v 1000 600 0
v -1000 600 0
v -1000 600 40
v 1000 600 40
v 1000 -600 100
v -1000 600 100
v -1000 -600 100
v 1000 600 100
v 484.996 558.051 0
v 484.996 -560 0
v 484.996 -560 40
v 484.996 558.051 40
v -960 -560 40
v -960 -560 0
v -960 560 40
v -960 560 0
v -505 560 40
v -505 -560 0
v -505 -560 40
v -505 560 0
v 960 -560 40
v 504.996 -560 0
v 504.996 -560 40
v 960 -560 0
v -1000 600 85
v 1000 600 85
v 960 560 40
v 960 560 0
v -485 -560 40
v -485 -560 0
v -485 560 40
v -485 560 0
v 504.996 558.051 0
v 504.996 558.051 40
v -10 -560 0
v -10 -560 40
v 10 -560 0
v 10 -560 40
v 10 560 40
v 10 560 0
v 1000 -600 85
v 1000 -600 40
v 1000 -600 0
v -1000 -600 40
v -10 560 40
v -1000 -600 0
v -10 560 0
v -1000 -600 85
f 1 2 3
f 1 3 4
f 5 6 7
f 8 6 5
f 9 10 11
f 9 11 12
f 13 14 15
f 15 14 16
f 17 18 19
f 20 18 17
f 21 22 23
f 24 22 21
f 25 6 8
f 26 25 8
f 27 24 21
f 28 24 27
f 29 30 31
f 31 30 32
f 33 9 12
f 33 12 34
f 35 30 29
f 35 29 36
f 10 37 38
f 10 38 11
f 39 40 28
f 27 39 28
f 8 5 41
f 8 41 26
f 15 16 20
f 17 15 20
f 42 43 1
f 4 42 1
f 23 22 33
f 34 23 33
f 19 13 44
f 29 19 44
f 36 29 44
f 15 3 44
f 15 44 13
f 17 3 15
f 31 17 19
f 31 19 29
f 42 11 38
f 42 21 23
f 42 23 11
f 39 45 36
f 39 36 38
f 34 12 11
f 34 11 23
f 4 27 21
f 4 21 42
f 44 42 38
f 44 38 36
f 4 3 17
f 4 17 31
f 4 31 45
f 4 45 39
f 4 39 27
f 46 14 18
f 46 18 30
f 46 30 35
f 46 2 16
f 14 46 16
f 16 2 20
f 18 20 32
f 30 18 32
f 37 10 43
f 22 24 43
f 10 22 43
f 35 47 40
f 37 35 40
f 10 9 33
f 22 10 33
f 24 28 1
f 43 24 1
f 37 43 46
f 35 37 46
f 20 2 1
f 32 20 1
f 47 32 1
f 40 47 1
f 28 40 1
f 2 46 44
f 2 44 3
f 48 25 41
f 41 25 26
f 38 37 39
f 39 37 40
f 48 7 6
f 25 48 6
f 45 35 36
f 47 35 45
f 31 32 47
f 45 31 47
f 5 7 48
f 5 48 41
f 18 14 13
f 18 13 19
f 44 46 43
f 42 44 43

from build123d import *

# Parameters (mm, degrees)
F0_W     = 2000
F0_H     = 1200
F0_W_2   = 1920
F0_H_2   = 1120
F2_DEPTH = 40
F1_W     = 20
F1_H     = 1120
F3_DEPTH = 40
F5_W     = 2000
F5_H     = 1200
F6_DEPTH = 15


with BuildPart() as f2:
    # F0 (on Top) → F2 (new body)
    with BuildSketch(Plane.XY):
        Rectangle(F0_W, F0_H)
        Rectangle(F0_W_2, F0_H_2, mode=Mode.SUBTRACT)
    extrude(amount=F2_DEPTH)

    # F1 (on Top) → F3 (join)
    with BuildSketch(Plane.XY):
        Rectangle(F1_W, F1_H)
        with Locations((494.996164, -1.948804)):
            Rectangle(F1_W, F1_H)
        with Locations((-495, 0)):
            Rectangle(F1_W, F1_H)
    extrude(amount=F3_DEPTH)


with BuildPart() as f6:
    # F5 (on offset) → F6 (new body)
    with BuildSketch(Plane.XY.offset(100)):
        Rectangle(F5_W, F5_H)
    extrude(amount=-F6_DEPTH)


solid = Compound([f2.part, f6.part])
